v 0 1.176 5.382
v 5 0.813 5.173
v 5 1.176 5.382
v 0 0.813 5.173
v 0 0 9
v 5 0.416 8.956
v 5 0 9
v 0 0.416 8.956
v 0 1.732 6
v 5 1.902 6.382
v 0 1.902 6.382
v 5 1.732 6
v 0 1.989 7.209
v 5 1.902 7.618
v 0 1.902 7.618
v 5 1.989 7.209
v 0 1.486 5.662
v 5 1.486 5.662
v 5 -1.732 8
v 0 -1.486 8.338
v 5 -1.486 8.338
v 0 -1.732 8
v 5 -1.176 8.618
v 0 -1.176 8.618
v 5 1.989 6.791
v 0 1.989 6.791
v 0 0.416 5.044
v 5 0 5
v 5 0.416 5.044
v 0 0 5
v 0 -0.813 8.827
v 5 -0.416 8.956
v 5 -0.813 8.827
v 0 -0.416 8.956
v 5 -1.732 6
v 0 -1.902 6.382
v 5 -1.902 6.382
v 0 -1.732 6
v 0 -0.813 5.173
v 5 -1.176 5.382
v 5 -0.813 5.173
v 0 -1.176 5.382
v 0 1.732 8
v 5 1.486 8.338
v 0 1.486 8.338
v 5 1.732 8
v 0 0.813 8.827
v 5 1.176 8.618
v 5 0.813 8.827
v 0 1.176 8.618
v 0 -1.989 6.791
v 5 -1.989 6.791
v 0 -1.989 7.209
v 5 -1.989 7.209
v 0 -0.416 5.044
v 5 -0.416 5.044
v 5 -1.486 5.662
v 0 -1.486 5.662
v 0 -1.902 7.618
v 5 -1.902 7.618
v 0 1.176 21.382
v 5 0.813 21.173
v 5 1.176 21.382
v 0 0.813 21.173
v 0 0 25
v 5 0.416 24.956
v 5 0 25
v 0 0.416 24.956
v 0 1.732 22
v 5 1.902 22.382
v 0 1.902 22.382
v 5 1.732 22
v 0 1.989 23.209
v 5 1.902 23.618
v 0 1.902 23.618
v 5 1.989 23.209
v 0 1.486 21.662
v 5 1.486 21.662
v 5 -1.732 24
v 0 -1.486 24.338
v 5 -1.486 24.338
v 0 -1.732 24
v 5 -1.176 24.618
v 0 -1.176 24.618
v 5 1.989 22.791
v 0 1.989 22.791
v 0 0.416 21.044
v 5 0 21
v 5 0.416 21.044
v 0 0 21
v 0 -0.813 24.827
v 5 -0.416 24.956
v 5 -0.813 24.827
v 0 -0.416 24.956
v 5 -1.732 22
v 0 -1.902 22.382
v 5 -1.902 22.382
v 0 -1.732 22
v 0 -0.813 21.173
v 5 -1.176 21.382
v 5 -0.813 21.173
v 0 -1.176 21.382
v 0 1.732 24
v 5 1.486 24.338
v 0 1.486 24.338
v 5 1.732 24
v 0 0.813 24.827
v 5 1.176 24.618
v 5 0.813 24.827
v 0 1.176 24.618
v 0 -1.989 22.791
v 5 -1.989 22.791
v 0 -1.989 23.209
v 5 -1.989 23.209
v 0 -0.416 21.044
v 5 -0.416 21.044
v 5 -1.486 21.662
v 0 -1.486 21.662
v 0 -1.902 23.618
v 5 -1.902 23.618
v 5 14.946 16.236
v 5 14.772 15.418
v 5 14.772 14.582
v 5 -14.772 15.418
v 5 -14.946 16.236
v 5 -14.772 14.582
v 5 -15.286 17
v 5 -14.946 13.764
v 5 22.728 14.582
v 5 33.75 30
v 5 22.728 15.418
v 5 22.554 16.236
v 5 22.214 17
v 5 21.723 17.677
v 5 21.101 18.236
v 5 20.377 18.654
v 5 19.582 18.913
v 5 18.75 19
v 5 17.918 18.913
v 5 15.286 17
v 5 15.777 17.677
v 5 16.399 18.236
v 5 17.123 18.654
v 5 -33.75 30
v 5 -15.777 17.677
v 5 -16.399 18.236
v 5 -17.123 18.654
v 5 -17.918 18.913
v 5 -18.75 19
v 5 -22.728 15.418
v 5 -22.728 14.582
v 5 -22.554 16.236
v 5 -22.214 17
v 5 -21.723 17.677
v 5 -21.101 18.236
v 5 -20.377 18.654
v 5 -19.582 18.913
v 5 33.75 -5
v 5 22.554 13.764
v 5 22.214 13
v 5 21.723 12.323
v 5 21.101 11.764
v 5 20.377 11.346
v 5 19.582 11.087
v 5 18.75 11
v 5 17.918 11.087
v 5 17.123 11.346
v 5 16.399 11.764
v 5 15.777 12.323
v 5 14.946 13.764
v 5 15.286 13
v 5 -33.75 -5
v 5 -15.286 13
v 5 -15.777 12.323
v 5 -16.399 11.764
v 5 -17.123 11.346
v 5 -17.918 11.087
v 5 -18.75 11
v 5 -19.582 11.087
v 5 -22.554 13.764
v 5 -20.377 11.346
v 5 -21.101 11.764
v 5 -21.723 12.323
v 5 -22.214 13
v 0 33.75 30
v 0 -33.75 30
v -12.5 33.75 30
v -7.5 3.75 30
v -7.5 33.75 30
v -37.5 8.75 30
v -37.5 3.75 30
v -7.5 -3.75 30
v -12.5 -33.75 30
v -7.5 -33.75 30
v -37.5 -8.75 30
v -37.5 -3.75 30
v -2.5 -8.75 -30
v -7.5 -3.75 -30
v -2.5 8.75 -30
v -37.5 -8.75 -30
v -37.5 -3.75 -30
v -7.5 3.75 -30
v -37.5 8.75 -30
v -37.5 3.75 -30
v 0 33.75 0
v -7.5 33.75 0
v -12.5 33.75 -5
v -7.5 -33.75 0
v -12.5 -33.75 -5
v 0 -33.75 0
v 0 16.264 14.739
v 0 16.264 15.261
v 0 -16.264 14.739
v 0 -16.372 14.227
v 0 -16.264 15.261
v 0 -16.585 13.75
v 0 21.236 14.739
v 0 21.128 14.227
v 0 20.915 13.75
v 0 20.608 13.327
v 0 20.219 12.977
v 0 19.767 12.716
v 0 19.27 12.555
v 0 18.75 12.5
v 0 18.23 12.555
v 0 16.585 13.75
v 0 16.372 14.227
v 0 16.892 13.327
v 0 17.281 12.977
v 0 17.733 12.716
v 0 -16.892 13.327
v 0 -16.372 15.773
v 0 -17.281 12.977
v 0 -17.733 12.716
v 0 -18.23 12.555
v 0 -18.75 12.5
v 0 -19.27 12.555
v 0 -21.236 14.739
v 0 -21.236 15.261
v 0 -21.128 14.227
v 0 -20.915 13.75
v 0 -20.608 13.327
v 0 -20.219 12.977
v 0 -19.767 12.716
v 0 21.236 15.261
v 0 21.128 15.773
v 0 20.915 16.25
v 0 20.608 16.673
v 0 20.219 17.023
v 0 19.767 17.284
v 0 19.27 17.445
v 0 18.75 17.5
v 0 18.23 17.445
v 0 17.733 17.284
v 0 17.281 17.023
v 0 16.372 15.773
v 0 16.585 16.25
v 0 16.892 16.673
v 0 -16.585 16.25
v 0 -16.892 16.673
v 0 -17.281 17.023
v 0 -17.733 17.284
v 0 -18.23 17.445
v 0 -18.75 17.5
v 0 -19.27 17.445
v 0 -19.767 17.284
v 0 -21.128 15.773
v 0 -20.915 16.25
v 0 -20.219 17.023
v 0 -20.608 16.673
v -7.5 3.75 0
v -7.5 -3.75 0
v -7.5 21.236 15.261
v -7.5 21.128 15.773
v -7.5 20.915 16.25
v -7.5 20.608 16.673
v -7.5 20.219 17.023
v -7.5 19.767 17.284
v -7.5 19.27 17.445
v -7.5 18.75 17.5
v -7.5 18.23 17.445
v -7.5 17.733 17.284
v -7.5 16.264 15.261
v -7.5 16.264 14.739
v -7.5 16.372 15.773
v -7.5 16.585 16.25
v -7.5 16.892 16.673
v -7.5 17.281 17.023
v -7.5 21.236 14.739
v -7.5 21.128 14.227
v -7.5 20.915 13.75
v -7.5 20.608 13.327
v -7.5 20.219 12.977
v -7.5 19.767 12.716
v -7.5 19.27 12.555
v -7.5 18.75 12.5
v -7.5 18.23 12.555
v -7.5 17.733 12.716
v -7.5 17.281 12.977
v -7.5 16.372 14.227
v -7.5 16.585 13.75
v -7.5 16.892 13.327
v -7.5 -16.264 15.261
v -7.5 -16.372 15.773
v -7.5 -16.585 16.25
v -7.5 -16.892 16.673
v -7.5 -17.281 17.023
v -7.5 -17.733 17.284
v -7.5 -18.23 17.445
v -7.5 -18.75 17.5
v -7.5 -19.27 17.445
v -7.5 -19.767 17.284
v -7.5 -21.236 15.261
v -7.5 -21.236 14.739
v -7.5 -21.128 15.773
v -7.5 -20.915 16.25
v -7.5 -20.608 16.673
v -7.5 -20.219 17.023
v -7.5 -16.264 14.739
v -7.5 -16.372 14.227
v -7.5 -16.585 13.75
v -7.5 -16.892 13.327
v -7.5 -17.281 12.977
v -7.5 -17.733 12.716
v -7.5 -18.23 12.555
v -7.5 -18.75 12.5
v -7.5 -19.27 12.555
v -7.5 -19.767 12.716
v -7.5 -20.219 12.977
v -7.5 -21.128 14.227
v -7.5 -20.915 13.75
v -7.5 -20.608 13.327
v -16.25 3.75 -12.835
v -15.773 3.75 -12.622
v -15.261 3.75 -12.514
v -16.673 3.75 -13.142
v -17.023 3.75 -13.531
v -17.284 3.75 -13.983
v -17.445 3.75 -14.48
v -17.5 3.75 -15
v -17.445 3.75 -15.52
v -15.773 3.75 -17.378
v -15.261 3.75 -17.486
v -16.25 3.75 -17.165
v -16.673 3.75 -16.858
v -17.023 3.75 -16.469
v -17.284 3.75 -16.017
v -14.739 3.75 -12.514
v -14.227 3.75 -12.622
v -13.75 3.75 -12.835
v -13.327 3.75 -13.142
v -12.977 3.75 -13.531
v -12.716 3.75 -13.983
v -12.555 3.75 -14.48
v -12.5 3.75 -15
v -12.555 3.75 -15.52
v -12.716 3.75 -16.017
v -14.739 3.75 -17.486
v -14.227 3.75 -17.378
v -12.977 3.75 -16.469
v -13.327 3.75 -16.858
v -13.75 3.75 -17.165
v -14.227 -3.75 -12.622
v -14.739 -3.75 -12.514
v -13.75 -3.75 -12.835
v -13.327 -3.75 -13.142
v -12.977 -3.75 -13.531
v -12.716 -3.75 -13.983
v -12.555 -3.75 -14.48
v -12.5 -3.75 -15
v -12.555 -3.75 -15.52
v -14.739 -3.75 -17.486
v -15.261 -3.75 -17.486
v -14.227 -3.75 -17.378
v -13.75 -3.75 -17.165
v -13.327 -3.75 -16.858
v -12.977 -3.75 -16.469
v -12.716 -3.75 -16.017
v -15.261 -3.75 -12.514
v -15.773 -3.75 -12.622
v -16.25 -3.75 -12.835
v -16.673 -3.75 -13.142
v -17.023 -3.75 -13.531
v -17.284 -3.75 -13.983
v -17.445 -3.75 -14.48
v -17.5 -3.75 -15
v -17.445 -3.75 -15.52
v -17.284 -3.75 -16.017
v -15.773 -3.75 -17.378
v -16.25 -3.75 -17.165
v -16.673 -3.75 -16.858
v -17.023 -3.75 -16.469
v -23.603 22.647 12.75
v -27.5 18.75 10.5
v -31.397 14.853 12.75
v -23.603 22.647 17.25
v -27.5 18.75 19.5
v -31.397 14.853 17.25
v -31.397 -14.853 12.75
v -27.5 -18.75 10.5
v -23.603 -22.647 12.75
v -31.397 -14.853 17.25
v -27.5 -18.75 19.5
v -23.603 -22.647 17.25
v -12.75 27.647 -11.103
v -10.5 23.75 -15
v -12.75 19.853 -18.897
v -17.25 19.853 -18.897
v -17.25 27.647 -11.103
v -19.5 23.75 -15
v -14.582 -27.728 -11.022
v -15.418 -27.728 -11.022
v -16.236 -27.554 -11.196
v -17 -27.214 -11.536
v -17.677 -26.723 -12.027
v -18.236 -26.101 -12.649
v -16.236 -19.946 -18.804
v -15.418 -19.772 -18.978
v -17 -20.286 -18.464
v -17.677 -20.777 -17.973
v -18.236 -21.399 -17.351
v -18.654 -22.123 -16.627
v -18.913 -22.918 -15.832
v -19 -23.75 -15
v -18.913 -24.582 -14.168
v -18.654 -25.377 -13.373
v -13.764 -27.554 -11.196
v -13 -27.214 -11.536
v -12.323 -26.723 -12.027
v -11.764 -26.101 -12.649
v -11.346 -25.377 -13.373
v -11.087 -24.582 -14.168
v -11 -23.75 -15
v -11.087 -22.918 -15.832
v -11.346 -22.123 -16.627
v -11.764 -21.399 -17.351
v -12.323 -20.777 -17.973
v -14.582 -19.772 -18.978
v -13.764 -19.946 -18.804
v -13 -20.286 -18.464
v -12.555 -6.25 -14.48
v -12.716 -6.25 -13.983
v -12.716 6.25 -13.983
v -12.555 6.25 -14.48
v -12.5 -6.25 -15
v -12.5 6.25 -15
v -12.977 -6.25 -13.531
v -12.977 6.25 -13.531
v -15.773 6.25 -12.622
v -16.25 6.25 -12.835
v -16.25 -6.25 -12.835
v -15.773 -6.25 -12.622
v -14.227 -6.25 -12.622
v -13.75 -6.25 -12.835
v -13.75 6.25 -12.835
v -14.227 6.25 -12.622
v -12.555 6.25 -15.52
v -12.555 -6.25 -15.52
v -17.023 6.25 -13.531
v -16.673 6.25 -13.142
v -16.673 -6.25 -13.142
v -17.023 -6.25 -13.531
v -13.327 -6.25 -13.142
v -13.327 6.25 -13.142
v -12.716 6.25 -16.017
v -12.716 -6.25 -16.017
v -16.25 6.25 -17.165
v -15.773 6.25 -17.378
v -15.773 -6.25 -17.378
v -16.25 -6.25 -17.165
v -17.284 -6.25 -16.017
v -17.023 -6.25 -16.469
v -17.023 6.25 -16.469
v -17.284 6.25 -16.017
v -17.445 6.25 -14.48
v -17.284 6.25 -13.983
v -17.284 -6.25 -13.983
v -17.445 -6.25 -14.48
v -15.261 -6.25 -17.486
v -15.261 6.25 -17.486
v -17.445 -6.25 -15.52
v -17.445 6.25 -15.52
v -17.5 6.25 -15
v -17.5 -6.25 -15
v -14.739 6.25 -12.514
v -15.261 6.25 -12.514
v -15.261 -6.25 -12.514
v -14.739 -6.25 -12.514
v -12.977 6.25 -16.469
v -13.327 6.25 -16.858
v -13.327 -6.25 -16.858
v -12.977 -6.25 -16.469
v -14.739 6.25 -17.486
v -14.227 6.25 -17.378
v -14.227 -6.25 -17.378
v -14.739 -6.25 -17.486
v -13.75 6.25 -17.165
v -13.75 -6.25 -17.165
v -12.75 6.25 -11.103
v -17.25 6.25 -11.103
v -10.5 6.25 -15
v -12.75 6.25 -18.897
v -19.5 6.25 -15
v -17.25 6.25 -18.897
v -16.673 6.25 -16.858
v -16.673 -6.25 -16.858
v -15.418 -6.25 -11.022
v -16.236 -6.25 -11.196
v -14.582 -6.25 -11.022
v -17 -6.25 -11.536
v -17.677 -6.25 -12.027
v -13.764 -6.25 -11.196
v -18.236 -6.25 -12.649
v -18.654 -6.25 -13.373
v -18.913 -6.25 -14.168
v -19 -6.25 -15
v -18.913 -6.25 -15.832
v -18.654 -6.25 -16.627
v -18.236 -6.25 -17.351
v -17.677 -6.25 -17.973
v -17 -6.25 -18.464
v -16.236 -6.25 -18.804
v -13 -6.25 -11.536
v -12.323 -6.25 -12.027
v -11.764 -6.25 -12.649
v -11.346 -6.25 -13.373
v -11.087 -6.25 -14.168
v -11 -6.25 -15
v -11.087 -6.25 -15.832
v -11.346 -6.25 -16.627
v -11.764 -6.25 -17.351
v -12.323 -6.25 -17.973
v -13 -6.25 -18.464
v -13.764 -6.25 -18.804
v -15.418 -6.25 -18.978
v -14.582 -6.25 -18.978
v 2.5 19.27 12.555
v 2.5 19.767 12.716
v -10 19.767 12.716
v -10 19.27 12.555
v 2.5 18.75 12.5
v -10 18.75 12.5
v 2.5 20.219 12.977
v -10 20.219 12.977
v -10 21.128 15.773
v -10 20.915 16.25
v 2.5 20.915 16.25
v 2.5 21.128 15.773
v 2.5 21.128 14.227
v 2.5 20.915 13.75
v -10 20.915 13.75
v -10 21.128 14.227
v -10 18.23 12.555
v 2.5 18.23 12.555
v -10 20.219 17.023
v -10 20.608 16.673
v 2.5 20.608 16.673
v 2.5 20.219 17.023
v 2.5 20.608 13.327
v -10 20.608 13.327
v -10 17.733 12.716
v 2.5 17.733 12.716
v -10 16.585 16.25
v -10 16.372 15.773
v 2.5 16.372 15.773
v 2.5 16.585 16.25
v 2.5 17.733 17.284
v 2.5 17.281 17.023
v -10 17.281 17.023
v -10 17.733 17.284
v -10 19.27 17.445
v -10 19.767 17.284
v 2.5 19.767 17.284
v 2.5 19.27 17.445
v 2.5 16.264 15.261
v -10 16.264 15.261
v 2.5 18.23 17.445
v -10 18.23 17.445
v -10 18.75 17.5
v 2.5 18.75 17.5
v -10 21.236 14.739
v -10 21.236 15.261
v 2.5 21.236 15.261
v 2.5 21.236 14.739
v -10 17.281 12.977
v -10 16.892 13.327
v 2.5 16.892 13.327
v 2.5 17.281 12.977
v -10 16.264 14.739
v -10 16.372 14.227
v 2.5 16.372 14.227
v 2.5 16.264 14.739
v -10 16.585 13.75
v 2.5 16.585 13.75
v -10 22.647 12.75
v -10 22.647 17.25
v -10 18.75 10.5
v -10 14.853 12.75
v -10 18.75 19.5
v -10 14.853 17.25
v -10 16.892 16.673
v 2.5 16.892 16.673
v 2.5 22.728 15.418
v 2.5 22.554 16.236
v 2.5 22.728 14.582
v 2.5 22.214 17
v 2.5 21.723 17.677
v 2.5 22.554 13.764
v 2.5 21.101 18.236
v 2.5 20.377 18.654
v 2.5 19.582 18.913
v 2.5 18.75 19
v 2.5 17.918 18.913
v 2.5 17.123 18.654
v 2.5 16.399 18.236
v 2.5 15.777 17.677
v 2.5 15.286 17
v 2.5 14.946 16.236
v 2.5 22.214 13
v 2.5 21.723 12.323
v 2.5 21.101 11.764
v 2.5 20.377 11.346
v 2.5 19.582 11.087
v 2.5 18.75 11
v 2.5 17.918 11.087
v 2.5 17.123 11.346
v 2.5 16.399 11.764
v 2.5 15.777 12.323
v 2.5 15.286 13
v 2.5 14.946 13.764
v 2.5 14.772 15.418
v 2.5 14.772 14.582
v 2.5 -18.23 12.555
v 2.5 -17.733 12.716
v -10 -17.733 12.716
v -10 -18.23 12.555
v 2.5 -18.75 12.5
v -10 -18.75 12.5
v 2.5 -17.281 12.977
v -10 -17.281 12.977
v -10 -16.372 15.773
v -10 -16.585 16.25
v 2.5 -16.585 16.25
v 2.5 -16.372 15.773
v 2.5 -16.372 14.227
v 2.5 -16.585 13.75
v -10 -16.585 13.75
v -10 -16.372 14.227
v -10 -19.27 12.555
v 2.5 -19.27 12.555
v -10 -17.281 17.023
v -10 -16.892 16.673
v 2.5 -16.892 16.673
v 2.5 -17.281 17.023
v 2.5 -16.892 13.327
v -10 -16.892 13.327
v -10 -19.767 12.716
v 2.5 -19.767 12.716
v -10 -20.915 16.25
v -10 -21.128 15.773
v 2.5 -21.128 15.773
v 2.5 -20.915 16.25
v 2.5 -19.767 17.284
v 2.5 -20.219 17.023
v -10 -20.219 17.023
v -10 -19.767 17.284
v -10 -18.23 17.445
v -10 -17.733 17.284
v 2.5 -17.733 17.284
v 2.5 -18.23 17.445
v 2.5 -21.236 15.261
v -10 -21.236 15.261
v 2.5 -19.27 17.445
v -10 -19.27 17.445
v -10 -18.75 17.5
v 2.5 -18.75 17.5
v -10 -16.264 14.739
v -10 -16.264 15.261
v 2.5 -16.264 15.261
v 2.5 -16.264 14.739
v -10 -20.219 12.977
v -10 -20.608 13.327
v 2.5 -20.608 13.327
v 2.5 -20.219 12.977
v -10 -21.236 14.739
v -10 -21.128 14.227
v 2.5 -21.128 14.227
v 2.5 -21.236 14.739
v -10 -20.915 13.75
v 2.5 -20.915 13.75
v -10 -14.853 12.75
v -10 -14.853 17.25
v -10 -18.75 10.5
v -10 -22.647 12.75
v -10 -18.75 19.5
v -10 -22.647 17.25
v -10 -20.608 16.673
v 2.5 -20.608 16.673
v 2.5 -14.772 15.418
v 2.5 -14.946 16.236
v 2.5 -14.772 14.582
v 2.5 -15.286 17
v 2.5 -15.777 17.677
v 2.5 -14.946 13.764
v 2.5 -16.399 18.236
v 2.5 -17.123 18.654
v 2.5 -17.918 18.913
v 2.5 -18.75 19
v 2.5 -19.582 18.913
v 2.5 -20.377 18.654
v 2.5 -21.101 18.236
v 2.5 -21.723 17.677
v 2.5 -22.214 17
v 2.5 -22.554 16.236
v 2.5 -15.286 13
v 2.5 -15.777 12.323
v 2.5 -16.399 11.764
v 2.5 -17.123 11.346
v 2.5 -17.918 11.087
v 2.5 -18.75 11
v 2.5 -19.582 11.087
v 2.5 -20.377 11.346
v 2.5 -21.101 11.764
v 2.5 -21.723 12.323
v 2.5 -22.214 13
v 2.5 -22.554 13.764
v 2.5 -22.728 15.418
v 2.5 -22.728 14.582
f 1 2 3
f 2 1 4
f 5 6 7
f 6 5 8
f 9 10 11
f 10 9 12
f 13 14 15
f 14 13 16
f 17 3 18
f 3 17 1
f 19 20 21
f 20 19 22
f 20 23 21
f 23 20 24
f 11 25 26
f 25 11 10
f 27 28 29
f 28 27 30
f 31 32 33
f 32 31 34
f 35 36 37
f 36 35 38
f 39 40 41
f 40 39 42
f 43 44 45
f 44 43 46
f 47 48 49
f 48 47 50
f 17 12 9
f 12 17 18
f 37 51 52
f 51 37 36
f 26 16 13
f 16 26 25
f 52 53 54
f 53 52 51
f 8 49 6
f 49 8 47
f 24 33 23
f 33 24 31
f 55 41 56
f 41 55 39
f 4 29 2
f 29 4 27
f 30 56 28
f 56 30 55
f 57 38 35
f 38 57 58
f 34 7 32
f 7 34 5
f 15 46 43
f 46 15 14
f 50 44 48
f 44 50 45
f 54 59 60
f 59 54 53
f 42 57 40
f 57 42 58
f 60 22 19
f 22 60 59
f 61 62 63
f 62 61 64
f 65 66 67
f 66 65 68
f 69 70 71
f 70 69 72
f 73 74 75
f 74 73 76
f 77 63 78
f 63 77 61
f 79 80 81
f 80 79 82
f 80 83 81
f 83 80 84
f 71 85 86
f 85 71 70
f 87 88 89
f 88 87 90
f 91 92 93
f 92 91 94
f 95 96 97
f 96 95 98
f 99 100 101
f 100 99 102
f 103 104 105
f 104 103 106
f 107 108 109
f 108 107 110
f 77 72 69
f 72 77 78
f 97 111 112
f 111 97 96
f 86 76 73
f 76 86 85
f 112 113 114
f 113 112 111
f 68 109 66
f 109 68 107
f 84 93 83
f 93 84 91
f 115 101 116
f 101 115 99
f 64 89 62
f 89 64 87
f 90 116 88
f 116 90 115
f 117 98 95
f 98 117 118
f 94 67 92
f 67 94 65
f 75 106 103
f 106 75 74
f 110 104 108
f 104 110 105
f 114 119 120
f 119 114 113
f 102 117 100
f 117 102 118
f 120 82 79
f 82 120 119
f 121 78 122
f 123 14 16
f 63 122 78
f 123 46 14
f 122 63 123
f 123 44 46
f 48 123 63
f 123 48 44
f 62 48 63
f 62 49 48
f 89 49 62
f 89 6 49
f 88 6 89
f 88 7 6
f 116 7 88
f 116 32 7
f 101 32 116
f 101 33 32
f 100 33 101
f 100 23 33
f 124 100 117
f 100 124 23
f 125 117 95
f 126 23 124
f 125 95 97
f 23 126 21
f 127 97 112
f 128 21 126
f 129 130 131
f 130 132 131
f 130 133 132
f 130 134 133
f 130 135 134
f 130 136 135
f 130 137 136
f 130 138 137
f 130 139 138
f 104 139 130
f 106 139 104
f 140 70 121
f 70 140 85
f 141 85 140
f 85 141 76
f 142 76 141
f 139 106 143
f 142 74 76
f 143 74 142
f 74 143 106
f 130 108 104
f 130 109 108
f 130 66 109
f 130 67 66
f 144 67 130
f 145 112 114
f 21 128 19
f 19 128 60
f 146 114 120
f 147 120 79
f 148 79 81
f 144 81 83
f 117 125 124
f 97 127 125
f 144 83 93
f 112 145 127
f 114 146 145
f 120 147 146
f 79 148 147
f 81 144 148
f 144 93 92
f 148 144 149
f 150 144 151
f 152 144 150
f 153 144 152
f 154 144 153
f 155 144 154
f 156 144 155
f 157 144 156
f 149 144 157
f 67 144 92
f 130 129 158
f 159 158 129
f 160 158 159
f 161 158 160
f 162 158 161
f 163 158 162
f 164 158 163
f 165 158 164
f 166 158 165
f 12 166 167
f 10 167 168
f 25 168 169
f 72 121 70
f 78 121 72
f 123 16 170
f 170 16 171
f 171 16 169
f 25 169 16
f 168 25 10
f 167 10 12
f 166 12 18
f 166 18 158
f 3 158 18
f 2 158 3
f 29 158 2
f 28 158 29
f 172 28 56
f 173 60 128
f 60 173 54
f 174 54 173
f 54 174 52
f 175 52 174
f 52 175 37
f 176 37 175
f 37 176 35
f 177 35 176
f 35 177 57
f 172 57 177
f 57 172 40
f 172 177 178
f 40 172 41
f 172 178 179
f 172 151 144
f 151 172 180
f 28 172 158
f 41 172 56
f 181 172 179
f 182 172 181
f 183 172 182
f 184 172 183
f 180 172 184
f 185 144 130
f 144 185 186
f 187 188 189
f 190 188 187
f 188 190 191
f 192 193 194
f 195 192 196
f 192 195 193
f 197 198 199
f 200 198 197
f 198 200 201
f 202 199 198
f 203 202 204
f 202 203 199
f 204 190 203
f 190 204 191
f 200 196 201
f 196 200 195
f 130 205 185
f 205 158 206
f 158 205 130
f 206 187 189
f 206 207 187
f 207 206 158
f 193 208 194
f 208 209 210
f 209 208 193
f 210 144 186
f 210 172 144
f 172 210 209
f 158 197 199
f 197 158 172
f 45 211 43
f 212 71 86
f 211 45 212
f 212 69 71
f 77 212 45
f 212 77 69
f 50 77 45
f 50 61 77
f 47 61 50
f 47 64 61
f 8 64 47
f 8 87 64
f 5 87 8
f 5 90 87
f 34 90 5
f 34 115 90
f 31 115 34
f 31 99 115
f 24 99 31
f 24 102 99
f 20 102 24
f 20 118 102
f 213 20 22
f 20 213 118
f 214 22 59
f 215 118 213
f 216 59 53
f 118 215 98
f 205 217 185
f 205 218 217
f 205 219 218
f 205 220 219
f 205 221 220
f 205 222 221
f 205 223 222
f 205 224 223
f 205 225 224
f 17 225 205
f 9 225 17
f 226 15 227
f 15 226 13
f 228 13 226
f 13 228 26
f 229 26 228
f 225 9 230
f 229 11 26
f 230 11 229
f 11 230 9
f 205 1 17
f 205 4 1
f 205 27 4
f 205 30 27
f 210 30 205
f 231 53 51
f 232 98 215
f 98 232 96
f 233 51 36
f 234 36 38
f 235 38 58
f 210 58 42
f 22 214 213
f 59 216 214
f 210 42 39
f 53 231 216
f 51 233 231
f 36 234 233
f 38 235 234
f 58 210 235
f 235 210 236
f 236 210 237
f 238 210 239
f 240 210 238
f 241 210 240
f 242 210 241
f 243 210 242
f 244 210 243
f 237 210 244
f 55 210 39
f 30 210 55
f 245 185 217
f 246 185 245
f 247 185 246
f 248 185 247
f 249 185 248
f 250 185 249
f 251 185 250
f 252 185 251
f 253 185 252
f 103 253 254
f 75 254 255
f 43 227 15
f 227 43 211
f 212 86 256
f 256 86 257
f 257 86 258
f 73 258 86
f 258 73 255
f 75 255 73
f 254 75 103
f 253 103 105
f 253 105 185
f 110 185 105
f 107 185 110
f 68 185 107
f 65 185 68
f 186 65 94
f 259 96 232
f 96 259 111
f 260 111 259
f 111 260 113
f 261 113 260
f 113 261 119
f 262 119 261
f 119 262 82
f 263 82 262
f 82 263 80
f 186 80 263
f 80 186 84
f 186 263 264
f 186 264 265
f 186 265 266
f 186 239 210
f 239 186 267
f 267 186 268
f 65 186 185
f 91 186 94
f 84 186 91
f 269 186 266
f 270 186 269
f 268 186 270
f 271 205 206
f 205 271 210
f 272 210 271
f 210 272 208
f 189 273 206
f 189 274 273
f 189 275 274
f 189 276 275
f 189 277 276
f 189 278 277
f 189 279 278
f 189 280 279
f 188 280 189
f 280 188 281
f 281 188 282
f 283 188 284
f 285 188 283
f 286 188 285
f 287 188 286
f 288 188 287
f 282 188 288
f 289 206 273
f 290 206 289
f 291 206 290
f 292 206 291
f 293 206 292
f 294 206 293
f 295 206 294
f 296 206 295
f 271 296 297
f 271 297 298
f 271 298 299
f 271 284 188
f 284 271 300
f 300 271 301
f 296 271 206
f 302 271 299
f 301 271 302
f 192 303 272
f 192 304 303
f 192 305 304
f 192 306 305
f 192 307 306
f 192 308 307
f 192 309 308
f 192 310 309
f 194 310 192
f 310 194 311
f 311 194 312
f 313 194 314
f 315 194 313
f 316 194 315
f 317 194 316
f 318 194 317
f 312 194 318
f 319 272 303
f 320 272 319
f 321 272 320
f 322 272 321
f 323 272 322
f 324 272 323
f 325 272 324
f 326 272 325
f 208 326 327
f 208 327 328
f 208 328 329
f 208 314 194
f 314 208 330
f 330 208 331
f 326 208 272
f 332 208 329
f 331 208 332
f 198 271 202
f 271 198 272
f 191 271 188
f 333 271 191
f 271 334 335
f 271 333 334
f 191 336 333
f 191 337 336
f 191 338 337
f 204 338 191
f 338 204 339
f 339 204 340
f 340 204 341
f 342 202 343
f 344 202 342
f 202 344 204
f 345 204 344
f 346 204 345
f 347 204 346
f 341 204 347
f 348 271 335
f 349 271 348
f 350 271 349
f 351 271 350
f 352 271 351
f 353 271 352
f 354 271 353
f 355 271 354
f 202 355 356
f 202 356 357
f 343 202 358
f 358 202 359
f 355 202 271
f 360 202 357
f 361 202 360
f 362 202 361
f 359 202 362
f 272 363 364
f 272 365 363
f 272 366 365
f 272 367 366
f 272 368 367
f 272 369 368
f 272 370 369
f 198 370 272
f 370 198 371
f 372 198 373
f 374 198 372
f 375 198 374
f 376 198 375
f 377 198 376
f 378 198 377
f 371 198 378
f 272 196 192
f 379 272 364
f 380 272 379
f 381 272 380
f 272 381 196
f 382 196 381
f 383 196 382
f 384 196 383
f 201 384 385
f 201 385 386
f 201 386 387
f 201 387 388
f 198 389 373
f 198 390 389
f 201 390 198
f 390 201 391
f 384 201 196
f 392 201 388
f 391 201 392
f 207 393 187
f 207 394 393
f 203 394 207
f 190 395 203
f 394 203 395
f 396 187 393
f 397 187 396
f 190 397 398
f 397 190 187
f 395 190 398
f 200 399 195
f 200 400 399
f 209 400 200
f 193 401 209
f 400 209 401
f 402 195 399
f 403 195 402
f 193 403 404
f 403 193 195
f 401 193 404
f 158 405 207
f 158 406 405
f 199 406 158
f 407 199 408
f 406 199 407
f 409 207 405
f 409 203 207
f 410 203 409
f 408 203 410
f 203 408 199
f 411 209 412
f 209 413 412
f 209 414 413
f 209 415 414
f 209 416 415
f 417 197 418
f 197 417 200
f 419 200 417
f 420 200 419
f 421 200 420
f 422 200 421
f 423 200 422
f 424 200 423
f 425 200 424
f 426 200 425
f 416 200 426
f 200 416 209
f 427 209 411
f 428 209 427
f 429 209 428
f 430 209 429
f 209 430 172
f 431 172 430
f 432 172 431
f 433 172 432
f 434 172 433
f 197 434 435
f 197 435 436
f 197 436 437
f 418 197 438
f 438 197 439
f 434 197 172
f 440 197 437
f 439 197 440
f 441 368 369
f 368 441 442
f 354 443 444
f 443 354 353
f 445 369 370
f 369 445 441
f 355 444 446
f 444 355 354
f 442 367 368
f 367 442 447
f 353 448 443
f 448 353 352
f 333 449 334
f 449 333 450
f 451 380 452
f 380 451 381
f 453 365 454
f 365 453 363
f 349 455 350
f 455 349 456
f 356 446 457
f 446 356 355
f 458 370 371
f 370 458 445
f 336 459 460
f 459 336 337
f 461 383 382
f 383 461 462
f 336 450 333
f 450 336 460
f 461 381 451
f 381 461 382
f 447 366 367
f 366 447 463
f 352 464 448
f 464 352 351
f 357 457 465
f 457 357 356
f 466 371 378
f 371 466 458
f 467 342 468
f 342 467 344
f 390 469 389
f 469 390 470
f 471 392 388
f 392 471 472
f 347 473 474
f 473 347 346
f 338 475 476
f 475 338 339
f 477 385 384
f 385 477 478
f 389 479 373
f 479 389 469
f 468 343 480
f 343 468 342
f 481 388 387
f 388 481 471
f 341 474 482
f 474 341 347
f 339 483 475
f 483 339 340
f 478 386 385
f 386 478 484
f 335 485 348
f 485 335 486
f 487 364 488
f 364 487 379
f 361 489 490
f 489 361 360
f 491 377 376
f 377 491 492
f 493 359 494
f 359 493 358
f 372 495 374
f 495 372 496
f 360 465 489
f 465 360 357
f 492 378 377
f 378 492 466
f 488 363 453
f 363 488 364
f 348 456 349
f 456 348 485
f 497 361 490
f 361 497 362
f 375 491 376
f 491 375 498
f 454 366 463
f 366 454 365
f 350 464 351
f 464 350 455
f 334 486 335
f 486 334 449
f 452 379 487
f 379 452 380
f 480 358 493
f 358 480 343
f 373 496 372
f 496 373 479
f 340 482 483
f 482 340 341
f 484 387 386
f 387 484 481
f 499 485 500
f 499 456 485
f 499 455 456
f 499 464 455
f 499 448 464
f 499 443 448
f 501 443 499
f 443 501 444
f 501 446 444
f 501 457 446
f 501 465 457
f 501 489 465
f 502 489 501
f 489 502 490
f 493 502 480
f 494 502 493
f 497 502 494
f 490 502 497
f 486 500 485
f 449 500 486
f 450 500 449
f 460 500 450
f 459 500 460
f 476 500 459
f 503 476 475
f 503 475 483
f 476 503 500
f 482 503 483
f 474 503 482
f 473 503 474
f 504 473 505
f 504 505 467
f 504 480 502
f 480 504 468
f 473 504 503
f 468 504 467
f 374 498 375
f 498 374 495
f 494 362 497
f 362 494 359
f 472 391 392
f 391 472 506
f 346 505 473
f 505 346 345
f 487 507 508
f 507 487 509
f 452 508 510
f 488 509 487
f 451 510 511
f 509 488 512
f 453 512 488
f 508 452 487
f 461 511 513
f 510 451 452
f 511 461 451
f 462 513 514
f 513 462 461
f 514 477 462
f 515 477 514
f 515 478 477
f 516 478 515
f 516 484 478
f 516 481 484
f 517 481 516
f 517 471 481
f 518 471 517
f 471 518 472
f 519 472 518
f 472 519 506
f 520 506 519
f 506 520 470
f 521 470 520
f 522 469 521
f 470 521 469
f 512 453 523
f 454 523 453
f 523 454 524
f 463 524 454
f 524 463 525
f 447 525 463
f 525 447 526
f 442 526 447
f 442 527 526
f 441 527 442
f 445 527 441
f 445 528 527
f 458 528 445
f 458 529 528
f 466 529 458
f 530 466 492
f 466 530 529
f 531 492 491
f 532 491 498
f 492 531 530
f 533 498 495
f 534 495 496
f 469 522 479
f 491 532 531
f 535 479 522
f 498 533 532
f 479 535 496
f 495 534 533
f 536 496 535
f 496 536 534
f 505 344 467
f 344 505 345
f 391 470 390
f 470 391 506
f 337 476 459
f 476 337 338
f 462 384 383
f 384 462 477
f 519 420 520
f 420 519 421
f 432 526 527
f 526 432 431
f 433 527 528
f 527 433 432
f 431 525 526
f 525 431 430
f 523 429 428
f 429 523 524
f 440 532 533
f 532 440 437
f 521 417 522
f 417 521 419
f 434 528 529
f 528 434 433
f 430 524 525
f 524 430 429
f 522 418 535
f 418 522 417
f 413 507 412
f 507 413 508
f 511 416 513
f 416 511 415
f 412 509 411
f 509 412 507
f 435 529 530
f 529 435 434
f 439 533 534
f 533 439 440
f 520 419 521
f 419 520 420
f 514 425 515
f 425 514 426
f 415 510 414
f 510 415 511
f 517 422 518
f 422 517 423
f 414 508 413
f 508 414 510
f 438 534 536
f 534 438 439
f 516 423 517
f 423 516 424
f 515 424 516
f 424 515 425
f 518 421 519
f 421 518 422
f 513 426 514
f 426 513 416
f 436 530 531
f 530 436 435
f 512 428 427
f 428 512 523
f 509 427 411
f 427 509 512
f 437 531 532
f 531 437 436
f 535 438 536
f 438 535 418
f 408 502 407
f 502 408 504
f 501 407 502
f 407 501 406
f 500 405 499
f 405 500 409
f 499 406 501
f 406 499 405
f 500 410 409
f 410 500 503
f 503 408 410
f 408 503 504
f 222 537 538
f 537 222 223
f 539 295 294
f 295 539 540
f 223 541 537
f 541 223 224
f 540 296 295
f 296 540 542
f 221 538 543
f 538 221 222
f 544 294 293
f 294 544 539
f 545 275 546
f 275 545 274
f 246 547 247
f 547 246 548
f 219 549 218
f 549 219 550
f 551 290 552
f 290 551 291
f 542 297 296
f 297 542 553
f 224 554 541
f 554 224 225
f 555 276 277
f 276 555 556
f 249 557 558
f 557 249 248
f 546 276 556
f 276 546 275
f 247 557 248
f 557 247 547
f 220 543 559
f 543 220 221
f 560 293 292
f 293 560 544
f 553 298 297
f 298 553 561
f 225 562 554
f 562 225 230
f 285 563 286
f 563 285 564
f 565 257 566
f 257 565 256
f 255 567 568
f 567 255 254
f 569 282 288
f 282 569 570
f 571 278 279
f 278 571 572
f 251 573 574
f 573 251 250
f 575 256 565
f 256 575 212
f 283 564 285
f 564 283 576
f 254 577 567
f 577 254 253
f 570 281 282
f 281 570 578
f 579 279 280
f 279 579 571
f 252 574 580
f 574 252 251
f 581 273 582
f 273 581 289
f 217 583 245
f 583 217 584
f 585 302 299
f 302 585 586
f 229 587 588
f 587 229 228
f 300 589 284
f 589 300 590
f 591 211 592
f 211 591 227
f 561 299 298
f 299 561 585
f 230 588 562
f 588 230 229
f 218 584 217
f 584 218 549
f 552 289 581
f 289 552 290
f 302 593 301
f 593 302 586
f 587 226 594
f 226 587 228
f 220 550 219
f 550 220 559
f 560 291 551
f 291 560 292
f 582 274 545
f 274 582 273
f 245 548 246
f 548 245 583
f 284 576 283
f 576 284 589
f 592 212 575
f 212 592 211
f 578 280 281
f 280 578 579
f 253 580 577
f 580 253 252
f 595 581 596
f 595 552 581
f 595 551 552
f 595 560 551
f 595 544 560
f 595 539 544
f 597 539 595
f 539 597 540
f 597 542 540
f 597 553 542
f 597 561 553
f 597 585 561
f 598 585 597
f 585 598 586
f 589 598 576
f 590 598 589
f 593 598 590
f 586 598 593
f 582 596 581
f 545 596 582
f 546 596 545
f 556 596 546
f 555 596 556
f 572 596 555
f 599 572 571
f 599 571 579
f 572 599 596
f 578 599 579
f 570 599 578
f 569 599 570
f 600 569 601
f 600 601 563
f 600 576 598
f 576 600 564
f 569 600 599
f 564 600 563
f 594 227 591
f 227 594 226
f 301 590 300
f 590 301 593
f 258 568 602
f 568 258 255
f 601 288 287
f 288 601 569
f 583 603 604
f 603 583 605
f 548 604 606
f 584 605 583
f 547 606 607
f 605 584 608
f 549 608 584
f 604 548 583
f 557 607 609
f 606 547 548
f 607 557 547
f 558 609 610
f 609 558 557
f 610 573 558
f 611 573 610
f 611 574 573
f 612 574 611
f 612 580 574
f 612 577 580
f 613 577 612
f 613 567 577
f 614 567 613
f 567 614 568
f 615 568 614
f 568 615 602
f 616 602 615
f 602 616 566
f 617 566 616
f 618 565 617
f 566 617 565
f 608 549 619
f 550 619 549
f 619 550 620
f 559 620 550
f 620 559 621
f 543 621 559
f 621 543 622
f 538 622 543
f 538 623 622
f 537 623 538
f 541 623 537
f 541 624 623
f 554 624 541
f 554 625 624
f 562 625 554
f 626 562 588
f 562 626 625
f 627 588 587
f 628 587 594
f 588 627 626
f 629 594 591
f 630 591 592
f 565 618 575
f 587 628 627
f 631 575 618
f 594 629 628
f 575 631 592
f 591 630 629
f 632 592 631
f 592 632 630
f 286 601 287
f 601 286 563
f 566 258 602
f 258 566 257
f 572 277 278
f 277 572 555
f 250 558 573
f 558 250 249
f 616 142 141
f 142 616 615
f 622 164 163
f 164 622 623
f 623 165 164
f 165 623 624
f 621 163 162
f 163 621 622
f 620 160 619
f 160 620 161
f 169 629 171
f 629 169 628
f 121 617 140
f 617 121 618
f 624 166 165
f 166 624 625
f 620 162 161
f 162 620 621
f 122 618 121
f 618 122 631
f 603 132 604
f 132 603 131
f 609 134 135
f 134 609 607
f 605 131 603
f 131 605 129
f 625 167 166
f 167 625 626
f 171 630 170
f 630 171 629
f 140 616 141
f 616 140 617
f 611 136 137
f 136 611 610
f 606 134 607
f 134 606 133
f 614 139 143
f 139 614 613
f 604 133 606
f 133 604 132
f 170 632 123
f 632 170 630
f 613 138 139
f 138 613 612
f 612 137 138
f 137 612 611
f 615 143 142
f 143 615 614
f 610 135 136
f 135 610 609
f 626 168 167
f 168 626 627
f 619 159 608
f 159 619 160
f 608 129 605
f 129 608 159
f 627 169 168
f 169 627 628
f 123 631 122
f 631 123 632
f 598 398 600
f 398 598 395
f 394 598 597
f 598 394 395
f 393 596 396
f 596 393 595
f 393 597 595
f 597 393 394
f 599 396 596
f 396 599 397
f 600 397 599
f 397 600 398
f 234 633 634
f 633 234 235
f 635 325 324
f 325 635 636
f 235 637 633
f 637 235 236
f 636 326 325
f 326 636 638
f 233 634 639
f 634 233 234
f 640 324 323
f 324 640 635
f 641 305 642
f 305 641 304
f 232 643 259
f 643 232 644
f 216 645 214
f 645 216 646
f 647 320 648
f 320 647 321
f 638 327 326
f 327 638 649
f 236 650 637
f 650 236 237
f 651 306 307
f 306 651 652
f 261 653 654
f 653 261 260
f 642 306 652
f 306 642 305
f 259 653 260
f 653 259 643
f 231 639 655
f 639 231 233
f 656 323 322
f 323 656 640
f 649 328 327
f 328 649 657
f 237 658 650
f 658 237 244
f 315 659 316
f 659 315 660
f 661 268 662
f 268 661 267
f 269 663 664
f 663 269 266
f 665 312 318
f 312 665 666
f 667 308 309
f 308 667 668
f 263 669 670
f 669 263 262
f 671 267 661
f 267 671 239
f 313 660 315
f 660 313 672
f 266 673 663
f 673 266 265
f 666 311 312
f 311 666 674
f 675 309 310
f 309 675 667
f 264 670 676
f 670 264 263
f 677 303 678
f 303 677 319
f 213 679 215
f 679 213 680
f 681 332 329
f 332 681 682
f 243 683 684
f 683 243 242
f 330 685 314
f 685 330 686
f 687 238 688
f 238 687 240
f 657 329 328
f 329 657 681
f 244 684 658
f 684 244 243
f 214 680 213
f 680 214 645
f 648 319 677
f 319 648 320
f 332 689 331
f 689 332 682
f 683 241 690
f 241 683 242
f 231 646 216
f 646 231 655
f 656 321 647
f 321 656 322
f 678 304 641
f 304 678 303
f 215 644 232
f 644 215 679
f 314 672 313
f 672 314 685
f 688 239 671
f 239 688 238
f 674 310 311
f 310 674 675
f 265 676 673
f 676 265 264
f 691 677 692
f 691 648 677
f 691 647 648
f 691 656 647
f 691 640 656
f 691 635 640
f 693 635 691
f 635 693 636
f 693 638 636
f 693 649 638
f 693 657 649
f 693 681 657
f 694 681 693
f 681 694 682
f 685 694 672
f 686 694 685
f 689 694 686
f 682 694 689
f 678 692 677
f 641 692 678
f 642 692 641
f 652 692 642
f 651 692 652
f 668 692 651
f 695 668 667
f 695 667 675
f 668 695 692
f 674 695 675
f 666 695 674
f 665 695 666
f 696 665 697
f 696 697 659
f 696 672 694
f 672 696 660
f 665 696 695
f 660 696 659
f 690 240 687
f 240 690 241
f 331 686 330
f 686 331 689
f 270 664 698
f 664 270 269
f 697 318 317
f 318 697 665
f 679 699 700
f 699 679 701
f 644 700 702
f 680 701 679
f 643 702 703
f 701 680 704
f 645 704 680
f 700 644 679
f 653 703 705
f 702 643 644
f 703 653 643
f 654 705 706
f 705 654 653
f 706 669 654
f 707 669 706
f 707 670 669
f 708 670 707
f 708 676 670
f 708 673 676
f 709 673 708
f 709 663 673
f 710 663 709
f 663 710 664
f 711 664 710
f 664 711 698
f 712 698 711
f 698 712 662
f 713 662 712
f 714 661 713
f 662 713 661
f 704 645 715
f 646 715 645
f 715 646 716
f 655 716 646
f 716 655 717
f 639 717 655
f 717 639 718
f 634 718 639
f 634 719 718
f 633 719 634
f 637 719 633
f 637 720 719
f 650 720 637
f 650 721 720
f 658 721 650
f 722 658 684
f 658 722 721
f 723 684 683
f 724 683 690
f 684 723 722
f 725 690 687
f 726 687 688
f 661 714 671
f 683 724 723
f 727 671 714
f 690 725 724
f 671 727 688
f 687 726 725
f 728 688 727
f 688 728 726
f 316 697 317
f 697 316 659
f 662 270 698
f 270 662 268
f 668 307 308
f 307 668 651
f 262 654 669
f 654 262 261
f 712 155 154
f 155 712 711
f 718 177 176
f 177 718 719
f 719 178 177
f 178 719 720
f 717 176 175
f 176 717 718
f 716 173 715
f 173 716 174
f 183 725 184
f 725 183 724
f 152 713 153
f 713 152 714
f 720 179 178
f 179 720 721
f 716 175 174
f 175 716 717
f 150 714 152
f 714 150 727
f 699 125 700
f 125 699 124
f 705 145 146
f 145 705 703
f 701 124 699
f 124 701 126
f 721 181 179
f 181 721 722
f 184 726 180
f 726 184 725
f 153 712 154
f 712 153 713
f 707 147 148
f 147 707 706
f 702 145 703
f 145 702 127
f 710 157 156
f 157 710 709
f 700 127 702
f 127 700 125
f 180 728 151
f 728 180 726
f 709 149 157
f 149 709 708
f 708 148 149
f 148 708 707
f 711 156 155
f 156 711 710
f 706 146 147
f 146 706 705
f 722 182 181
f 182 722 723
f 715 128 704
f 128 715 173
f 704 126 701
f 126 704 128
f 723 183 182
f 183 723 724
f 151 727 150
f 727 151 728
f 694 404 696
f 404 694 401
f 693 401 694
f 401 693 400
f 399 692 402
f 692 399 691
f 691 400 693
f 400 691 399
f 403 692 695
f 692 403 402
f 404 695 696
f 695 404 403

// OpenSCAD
/*
    The front of the x and z axis is the point [0,0,0]
    all is drawn in referenct to that point
    up    == +z
    down  == -z
    left  == -x
    right == +x
    back  == -y 

    the support does not have to be symetric, so left and right
    can differ.
    
    For instanxe 
        left = 35 and right = 65 for the left support
        left = 65 and right = 30 for the right support
    
    

*/

left             = 30;  // 35
right            = 30;  // 65
up               = 30;
down             = 30;
back             = 30;
thicknessStud    = 7.5;  // Thickness acrylic studs
minimumThickness = 5;  // minimal thickness of the walls

boltHead = 8;
bolt     = 5;
nut      = 9;

// use exsisting screws
screws = true; // use the tronxy screws to fasten the brackt
screw1 = 7;    // height of first screw
screw2 = 23;   // height of second screw


bracket();

module bracket() {
    difference() {
        bijgewerktBlok();
 //       reinforcement();
        dikkeBout();
    }    
}

module dikkeBout() {
    translate([-back/2, 0, -down / 2])
    rotate([90, 0, 0])
    boltHole();
    translate([-thicknessStud / 2, (right + thicknessStud) / 2, up / 2])
    rotate([0, 90, 0])
    boltHole();
    translate([-thicknessStud / 2, -(left + thicknessStud) / 2, up / 2])
    rotate([0, 90, 0])
    boltHole();
}

module boltHole() {
    // maximum bore hole on one side 
    maxHole = max(left, right, back);
    // shift holes
    shift = (thicknessStud + minimumThickness) / 2;
    
    union() {
        // middle part
        cylinder(  d = bolt
                 , center = true
                 , h = thicknessStud + minimumThickness 
                 , $fn = 30);
        // hole for screw head
        translate([0,0,shift])
        cylinder(  d = boltHead
                 , h = maxHole 
                 , $fn = 30);
        // hole for screw head
        translate([0,0,-maxHole - shift])
        cylinder(  d = nut
                 , h = maxHole 
                 , $fn = 6);
    }
}

module reinforcement() {
    x = 2;
    y = 40;
    z = 15;
    
    translate([(minimumThickness - x ) / 2
            , (-y + thicknessStud)/2 
            , up - z])
    cube([x, y, z]);
}

module bijgewerktBlok() {
    hoogte = up + down;
    breedte = left + right + thicknessStud;
    diepte = minimumThickness + thicknessStud + back;
    h1 = -atan((back - minimumThickness) / (right - minimumThickness));  // hoek right
    h2 = -atan((back - minimumThickness) / (left - minimumThickness));  // hoek right
    h3 = -atan((right - minimumThickness) / (down - minimumThickness));  // hoek right
    h4 = -atan((left - minimumThickness) / (down - minimumThickness));  // hoek right
    difference() {
        block();
        //right up
        translate([-(back + thicknessStud) 
                , thicknessStud / 2 + minimumThickness
                , -hoogte ])
        rotate([0,0,h1])
        translate([-back, 0, 0])
        cube([back, diepte * 2, hoogte * 2]);
        // left up
        translate([-(back + thicknessStud) 
                , -(thicknessStud / 2 + minimumThickness)
                , -hoogte])
        rotate([0,0, -h2])
        translate([-back * 1, -hoogte * 2, 0])
        cube([back * 1, hoogte * 3, hoogte * 2]);
        // right down
        translate([-diepte * 1.5
                 , right + thicknessStud / 2
                 , -minimumThickness])
        rotate([h3, 0, 0])
        translate([0, 0, - breedte * 2])
        cube([diepte * 2, right, breedte * 2]);
        // left down
        translate([-diepte * 1.5
                 , -(left + thicknessStud / 2)
                 , -minimumThickness])
        rotate([-h4 , 0, 0])
        translate([0, -left, - breedte * 2])
        cube([diepte * 2, left, breedte * 2]);
    }


}

// start with massive bloc, with only the 
// cutouts for the acrylic parts and the screws
module block() {
    l = minimumThickness  + thicknessStud + back;
    b = left  + thicknessStud + right;
    h = down + up;
   
    l2 = minimumThickness + thicknessStud * 2;

    hoek = atan((thicknessStud) / (down - minimumThickness));
    echo (hoek=hoek);
    difference() {
        translate([minimumThickness - l
        , -left - thicknessStud /2
        , -down])
        cube([l, b, h]);
        // make lower part movable
        translate([minimumThickness,0 ,-minimumThickness])
        rotate([0,hoek, 0])
        translate([0, -b , -down])
        cube([minimumThickness * 2, b * 2, down]);
        // y support cutout 
        translate([-thicknessStud, -left - b/2, 0])
        cube([thicknessStud, b * 2,up * 2]);
        // cutout for screws (TRONXY ONLY)
        if (screws) {
            screwHole(screw1);
            screwHole(screw2);
        } else {
            translate([-l2 + minimumThickness / 2
            , -thicknessStud / 2
            , 0])
            cube([l2 , thicknessStud, up * 2]);
        }
        // Z-support cutout
        translate([-l - thicknessStud
        , -thicknessStud / 2
        , -h])
        cube([l , thicknessStud, h * 2]);
    }
}

module screwHole(screw) {
    translate([ minimumThickness / 2
               , 0
               , screw]) 
    rotate([0, 90, 0])
    cylinder(d = 4
           , h = minimumThickness * 2
           , $fn = 30
           , center = true);
}
